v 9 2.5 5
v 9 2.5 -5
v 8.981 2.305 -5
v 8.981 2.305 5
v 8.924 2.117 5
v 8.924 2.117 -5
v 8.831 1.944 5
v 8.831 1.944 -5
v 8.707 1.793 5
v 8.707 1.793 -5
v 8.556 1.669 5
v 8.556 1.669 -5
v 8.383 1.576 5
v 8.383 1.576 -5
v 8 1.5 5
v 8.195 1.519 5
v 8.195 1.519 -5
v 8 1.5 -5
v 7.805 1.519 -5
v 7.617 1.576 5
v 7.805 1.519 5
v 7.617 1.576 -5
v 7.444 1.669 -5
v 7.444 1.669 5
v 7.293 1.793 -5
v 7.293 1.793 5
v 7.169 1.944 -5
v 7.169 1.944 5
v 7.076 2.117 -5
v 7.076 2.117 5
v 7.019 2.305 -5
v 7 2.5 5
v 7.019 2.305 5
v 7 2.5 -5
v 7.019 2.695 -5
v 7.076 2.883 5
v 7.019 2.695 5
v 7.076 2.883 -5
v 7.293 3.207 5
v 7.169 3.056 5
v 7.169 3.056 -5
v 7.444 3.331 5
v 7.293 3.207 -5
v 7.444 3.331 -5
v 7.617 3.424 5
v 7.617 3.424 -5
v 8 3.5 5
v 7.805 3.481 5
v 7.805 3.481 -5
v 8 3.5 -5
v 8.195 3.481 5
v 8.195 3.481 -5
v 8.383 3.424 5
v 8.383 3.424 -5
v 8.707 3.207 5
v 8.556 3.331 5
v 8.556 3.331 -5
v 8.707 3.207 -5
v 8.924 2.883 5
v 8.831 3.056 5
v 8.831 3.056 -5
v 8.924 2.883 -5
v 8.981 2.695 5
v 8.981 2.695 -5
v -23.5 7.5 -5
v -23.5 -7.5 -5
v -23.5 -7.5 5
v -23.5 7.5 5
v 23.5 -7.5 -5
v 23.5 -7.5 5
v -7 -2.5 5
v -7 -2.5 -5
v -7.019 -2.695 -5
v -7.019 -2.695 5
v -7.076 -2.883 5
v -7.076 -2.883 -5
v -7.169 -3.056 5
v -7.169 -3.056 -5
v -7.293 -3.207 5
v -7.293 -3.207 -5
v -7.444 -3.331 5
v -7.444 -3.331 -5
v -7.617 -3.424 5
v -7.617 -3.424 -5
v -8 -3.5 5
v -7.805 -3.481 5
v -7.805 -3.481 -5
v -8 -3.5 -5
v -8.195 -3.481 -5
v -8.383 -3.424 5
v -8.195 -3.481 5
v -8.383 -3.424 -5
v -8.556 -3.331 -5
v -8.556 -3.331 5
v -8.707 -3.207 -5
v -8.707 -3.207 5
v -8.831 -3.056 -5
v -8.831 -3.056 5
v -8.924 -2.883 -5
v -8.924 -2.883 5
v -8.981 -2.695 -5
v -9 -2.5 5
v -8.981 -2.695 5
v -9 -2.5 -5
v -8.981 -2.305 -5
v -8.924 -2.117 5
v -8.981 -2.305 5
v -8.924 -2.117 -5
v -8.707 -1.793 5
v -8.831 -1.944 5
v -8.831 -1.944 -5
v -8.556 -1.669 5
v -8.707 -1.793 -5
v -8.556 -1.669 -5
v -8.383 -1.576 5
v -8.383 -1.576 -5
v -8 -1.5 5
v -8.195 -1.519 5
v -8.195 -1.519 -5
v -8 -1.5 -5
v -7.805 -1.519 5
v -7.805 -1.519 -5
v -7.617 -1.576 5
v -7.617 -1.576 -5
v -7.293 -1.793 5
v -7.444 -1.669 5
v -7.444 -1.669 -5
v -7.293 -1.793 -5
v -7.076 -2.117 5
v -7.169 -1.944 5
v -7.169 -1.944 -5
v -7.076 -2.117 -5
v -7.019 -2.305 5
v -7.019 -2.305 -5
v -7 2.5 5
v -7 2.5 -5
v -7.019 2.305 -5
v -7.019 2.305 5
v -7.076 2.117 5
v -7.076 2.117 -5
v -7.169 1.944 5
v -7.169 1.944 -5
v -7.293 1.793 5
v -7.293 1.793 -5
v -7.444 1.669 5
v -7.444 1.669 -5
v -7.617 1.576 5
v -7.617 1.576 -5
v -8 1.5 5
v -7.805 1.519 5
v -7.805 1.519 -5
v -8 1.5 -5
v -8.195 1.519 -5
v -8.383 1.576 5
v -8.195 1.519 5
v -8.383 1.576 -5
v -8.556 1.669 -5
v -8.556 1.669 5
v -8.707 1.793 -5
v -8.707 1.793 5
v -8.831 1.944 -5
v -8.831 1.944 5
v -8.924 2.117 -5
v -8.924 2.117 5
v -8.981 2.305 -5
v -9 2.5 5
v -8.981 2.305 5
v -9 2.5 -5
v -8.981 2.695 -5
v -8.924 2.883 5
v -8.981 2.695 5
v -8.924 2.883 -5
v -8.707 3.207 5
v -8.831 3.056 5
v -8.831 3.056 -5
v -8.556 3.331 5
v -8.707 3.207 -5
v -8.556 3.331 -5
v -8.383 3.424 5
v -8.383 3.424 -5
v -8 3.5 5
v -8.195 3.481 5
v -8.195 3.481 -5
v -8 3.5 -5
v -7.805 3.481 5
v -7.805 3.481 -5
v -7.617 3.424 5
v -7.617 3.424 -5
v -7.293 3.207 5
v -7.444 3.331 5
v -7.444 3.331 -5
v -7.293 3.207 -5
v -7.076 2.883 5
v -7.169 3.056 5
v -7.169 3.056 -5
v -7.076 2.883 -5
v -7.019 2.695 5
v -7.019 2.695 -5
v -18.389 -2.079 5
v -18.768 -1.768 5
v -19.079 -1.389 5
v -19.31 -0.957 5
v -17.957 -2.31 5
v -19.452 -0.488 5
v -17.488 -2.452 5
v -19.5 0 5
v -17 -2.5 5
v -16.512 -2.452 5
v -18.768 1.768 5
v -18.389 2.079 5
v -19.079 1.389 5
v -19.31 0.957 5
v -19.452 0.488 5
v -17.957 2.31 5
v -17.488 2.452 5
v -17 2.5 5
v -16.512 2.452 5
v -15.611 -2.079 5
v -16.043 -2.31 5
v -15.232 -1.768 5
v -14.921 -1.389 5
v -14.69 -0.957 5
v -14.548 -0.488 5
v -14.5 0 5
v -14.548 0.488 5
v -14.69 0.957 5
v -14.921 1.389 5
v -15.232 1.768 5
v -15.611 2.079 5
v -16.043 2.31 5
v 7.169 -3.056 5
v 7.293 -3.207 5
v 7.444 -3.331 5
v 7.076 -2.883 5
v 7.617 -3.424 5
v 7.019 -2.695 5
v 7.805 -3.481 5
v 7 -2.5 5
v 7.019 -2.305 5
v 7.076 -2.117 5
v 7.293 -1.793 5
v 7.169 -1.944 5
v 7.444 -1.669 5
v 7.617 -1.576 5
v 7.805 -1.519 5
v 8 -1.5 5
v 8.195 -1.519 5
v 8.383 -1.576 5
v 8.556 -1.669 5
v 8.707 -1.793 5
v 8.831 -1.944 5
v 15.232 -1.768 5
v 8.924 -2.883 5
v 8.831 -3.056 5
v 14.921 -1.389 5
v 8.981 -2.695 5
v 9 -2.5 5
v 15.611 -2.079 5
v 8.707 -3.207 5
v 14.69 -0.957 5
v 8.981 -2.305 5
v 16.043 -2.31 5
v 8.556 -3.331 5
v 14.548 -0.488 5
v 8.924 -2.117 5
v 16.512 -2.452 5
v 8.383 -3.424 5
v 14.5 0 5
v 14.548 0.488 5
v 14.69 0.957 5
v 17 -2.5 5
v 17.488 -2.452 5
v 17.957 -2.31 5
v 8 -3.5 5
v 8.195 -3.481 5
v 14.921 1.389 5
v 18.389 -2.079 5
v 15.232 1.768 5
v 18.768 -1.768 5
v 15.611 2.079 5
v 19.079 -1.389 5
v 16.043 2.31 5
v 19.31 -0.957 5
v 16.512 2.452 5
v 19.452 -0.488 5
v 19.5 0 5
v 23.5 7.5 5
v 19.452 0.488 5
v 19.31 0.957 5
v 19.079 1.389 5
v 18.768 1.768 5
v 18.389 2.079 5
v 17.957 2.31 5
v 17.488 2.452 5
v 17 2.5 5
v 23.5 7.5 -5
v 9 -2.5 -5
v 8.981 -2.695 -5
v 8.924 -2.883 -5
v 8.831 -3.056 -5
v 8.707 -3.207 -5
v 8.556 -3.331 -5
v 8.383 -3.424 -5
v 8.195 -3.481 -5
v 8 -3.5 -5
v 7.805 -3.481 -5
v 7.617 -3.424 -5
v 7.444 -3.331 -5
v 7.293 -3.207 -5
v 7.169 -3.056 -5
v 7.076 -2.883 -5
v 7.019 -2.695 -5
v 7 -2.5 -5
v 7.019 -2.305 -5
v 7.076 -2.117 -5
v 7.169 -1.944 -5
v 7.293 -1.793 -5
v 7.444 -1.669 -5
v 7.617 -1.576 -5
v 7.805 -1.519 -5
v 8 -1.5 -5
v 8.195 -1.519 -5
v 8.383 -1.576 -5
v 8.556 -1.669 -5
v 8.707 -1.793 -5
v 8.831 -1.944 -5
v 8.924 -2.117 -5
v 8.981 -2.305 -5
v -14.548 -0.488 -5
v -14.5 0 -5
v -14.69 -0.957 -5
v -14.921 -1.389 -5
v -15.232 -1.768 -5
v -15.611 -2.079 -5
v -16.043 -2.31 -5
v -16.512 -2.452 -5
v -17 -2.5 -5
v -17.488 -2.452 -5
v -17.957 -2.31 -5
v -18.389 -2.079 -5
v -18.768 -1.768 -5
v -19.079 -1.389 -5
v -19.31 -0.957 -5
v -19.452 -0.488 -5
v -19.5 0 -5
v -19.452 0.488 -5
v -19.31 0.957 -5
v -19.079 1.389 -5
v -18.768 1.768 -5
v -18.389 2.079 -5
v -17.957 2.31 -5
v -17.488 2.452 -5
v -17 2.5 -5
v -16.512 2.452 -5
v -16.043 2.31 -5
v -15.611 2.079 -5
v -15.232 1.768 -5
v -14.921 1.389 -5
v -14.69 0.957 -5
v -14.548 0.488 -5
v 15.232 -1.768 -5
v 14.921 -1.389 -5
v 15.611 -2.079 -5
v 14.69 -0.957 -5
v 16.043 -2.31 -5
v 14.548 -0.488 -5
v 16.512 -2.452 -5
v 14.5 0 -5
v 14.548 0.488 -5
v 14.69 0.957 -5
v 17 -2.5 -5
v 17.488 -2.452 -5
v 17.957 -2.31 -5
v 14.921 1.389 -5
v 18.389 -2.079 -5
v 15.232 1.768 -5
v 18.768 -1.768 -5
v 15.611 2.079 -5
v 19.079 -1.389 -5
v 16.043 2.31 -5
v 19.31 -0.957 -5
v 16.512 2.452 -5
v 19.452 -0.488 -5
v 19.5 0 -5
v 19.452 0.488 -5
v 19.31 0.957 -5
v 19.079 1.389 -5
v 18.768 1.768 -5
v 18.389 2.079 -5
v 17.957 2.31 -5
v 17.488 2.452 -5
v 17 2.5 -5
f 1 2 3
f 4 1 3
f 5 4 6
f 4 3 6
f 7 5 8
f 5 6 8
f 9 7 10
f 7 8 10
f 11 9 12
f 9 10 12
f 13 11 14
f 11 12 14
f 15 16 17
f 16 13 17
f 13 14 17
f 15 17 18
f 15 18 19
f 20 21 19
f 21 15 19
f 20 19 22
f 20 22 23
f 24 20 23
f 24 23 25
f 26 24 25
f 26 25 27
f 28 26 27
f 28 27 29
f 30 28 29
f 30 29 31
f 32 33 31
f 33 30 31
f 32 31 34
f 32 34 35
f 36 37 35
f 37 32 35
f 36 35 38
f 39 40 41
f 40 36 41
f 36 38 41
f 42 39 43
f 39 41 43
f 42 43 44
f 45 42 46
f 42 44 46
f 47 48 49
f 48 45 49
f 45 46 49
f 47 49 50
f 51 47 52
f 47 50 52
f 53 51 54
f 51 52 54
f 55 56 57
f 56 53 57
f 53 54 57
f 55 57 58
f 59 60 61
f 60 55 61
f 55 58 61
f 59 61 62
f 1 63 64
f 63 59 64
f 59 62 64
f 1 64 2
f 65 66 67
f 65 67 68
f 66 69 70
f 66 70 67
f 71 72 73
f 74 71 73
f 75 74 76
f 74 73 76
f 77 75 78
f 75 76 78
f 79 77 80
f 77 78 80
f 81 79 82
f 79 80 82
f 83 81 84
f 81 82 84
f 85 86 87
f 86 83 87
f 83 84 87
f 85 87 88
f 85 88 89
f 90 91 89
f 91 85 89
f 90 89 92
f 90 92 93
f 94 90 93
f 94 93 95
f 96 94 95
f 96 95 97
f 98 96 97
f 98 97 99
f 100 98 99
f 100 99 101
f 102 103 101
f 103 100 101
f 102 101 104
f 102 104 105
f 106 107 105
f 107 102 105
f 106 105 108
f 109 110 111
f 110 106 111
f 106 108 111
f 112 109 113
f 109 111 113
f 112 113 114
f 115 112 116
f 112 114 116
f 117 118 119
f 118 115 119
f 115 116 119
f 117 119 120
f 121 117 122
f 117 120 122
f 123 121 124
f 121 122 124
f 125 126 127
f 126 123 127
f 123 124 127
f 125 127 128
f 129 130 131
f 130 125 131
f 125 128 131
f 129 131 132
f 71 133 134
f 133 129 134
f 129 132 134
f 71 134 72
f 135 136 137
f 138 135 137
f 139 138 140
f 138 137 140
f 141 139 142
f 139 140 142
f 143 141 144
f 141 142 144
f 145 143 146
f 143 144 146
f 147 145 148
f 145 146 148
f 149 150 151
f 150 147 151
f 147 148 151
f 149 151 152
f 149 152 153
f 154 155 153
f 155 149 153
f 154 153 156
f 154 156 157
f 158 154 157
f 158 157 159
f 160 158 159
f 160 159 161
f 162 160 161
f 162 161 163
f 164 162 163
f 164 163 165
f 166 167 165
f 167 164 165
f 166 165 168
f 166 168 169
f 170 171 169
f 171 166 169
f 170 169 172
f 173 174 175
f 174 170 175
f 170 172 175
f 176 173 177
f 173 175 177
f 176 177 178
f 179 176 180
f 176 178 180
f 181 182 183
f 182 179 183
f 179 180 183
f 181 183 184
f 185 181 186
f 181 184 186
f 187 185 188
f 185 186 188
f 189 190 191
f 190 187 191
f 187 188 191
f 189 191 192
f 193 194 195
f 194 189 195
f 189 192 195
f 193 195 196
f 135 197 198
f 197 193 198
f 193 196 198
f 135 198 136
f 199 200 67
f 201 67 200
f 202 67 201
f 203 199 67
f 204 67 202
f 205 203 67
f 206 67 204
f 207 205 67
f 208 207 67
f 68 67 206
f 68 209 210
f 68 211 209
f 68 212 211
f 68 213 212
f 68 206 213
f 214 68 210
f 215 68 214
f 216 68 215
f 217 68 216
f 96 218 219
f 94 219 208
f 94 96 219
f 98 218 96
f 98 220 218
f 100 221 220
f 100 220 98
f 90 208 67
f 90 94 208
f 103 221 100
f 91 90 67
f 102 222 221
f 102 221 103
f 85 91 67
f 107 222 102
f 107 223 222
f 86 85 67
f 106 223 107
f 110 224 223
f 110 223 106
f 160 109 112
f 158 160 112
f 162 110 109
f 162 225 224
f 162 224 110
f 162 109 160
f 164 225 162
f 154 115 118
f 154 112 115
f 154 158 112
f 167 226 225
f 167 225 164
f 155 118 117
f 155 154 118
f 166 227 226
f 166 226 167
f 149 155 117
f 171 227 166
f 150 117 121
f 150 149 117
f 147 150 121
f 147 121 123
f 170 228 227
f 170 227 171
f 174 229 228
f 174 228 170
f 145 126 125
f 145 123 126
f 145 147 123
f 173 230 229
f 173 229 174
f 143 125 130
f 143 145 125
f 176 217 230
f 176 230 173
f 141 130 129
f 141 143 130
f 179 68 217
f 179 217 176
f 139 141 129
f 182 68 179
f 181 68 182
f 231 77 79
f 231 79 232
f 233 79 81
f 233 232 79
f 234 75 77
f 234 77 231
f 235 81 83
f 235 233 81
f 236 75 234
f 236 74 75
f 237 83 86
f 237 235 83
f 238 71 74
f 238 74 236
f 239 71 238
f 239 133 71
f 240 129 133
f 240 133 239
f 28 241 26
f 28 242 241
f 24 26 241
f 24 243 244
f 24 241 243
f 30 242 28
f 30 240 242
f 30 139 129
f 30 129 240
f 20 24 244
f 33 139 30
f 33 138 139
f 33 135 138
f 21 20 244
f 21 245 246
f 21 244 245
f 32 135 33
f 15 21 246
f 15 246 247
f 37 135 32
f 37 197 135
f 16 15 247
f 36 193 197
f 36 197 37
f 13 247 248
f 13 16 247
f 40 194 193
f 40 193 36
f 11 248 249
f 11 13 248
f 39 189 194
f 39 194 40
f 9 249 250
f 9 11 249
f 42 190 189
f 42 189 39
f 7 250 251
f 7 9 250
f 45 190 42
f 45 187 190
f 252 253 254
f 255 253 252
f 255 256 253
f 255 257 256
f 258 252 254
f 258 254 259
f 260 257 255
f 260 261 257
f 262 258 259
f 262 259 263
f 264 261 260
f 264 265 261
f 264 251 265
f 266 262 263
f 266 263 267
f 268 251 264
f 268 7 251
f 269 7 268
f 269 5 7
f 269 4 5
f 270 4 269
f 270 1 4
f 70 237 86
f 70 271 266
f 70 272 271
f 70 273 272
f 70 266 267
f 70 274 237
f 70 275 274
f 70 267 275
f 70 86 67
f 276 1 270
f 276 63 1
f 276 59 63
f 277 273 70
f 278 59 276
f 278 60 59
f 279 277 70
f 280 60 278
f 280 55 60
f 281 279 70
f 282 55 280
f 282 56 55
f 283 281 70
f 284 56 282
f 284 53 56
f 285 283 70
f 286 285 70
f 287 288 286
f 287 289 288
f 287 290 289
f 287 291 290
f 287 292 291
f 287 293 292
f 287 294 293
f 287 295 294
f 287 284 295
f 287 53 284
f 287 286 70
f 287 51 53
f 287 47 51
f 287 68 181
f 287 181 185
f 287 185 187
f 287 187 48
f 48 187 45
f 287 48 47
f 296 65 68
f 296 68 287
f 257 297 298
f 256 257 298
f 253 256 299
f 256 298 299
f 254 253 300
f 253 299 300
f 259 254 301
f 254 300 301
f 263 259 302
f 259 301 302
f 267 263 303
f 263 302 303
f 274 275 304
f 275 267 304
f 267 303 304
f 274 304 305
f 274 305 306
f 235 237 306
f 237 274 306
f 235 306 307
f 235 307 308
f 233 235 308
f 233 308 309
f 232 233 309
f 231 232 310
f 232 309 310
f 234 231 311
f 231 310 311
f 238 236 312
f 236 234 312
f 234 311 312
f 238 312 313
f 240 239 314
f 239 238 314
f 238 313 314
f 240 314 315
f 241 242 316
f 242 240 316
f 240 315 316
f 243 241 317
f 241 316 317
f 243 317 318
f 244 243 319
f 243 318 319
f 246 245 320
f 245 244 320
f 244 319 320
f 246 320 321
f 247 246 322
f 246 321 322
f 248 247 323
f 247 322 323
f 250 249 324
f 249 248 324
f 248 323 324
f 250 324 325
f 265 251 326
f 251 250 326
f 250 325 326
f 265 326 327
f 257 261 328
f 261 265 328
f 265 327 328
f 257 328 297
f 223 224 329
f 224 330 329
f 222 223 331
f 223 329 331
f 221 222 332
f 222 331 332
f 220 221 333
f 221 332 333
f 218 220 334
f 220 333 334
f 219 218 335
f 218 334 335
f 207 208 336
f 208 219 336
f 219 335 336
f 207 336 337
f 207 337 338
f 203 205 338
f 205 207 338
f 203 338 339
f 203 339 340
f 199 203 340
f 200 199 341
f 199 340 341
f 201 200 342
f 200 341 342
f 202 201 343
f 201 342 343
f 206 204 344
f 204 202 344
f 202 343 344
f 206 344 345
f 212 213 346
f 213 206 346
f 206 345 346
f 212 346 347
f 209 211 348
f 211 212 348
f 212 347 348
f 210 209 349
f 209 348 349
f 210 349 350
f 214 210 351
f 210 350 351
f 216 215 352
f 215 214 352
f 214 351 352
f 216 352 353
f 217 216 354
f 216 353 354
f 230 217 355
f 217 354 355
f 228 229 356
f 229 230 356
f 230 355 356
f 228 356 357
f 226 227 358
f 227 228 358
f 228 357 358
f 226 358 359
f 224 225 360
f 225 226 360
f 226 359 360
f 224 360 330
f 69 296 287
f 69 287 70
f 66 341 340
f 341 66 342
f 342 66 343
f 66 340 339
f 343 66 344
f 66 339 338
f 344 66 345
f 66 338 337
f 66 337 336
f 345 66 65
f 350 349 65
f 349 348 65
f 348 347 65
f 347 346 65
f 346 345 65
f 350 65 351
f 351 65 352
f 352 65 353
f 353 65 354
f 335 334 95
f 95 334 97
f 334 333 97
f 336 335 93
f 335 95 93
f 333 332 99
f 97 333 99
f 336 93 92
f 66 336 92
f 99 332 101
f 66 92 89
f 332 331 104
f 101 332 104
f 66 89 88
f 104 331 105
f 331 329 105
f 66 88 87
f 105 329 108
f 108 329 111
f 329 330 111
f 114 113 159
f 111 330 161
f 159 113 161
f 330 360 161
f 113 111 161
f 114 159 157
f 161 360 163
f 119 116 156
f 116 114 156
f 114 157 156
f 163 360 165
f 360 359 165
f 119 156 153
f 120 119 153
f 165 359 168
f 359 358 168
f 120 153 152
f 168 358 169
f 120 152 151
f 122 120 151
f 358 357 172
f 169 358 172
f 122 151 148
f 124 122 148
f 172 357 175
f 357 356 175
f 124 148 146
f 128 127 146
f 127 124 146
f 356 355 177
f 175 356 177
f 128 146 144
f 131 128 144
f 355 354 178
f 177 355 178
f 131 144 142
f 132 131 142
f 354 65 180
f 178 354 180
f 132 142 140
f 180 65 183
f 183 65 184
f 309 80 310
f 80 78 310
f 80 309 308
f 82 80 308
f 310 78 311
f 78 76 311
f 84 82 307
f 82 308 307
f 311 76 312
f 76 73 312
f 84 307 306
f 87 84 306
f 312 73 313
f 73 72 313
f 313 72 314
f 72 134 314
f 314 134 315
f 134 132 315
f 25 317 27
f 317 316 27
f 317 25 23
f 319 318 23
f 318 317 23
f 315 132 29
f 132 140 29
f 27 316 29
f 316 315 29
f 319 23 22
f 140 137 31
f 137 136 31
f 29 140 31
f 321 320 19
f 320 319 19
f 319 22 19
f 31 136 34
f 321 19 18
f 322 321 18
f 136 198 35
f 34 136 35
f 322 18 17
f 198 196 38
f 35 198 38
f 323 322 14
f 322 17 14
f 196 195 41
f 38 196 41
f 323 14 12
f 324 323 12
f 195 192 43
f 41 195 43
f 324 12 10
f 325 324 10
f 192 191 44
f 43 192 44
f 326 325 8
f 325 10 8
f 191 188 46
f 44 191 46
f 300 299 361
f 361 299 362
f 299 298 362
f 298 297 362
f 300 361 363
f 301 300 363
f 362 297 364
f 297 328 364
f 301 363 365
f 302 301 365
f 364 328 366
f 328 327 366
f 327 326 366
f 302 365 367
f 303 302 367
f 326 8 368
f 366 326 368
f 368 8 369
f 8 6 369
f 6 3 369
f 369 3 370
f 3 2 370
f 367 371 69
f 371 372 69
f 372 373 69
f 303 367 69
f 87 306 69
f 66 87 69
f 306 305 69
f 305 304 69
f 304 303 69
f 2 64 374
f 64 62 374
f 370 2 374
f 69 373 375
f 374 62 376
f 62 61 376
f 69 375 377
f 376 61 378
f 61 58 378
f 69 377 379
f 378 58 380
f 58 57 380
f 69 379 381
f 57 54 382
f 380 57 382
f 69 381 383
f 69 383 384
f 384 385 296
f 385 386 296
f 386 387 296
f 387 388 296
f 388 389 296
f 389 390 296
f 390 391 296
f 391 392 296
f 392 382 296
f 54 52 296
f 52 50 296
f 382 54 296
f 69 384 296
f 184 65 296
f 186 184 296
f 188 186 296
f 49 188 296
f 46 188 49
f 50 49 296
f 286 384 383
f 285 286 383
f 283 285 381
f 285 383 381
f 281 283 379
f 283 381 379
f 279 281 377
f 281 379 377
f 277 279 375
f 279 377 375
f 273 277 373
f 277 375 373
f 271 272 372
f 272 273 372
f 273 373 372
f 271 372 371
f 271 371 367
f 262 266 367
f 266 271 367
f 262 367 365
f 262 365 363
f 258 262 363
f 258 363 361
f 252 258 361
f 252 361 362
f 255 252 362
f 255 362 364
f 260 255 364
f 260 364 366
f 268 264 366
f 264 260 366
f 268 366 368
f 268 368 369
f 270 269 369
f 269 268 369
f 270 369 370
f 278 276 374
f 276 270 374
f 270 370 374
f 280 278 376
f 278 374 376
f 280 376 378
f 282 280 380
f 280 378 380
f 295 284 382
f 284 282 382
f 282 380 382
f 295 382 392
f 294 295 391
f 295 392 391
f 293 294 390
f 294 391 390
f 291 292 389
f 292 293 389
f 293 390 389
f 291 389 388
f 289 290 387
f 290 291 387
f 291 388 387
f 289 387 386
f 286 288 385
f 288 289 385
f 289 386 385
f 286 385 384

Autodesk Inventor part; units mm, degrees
sketch "Sketch1" plane through (0, 0, 0) normal (0, 0, 1) x (1, 0, 0)
  line L0 (-23.5, 7.5) -> (23.5, 7.5)
  line L1 (23.5, 7.5) -> (23.5, -7.5)
  line L2 (23.5, -7.5) -> (-23.5, -7.5)
  line L3 (-23.5, -7.5) -> (-23.5, 7.5)
  line L4 (-23.5, 7.5) -> (23.5, -7.5) construction
  line L5 (23.5, 7.5) -> (-23.5, -7.5) construction
  circle A0 centre (17, 0) radius 2.5
  circle A1 centre (8, 2.5) radius 1
  circle A2 centre (8, -2.5) radius 1
  line L6 (8, 2.5) -> (8, -2.5) construction
  line L7 (0, 7.5) -> (0, -7.5) construction
  circle A3 centre (-17, 0) radius 2.5
  circle A4 centre (-8, 2.5) radius 1
  circle A5 centre (-8, -2.5) radius 1
  point P0 (0, 0)
  point P1 (0, 0)
  point P2 (8, 0)
  point P3 (0, 0)
  dimension "d0" = 47
  dimension "d1" = 15
  dimension "d6" = 5
  dimension "d7" = 17
  dimension "d8" = 2
  dimension "d9" = 2
  dimension "d10" = 8
  dimension "d11" = 5
extrude "Extrusion1" add sketch "Sketch1" along normal mid plane 10
properties part number "suporte_motor_001" material "ABS Plastic"
